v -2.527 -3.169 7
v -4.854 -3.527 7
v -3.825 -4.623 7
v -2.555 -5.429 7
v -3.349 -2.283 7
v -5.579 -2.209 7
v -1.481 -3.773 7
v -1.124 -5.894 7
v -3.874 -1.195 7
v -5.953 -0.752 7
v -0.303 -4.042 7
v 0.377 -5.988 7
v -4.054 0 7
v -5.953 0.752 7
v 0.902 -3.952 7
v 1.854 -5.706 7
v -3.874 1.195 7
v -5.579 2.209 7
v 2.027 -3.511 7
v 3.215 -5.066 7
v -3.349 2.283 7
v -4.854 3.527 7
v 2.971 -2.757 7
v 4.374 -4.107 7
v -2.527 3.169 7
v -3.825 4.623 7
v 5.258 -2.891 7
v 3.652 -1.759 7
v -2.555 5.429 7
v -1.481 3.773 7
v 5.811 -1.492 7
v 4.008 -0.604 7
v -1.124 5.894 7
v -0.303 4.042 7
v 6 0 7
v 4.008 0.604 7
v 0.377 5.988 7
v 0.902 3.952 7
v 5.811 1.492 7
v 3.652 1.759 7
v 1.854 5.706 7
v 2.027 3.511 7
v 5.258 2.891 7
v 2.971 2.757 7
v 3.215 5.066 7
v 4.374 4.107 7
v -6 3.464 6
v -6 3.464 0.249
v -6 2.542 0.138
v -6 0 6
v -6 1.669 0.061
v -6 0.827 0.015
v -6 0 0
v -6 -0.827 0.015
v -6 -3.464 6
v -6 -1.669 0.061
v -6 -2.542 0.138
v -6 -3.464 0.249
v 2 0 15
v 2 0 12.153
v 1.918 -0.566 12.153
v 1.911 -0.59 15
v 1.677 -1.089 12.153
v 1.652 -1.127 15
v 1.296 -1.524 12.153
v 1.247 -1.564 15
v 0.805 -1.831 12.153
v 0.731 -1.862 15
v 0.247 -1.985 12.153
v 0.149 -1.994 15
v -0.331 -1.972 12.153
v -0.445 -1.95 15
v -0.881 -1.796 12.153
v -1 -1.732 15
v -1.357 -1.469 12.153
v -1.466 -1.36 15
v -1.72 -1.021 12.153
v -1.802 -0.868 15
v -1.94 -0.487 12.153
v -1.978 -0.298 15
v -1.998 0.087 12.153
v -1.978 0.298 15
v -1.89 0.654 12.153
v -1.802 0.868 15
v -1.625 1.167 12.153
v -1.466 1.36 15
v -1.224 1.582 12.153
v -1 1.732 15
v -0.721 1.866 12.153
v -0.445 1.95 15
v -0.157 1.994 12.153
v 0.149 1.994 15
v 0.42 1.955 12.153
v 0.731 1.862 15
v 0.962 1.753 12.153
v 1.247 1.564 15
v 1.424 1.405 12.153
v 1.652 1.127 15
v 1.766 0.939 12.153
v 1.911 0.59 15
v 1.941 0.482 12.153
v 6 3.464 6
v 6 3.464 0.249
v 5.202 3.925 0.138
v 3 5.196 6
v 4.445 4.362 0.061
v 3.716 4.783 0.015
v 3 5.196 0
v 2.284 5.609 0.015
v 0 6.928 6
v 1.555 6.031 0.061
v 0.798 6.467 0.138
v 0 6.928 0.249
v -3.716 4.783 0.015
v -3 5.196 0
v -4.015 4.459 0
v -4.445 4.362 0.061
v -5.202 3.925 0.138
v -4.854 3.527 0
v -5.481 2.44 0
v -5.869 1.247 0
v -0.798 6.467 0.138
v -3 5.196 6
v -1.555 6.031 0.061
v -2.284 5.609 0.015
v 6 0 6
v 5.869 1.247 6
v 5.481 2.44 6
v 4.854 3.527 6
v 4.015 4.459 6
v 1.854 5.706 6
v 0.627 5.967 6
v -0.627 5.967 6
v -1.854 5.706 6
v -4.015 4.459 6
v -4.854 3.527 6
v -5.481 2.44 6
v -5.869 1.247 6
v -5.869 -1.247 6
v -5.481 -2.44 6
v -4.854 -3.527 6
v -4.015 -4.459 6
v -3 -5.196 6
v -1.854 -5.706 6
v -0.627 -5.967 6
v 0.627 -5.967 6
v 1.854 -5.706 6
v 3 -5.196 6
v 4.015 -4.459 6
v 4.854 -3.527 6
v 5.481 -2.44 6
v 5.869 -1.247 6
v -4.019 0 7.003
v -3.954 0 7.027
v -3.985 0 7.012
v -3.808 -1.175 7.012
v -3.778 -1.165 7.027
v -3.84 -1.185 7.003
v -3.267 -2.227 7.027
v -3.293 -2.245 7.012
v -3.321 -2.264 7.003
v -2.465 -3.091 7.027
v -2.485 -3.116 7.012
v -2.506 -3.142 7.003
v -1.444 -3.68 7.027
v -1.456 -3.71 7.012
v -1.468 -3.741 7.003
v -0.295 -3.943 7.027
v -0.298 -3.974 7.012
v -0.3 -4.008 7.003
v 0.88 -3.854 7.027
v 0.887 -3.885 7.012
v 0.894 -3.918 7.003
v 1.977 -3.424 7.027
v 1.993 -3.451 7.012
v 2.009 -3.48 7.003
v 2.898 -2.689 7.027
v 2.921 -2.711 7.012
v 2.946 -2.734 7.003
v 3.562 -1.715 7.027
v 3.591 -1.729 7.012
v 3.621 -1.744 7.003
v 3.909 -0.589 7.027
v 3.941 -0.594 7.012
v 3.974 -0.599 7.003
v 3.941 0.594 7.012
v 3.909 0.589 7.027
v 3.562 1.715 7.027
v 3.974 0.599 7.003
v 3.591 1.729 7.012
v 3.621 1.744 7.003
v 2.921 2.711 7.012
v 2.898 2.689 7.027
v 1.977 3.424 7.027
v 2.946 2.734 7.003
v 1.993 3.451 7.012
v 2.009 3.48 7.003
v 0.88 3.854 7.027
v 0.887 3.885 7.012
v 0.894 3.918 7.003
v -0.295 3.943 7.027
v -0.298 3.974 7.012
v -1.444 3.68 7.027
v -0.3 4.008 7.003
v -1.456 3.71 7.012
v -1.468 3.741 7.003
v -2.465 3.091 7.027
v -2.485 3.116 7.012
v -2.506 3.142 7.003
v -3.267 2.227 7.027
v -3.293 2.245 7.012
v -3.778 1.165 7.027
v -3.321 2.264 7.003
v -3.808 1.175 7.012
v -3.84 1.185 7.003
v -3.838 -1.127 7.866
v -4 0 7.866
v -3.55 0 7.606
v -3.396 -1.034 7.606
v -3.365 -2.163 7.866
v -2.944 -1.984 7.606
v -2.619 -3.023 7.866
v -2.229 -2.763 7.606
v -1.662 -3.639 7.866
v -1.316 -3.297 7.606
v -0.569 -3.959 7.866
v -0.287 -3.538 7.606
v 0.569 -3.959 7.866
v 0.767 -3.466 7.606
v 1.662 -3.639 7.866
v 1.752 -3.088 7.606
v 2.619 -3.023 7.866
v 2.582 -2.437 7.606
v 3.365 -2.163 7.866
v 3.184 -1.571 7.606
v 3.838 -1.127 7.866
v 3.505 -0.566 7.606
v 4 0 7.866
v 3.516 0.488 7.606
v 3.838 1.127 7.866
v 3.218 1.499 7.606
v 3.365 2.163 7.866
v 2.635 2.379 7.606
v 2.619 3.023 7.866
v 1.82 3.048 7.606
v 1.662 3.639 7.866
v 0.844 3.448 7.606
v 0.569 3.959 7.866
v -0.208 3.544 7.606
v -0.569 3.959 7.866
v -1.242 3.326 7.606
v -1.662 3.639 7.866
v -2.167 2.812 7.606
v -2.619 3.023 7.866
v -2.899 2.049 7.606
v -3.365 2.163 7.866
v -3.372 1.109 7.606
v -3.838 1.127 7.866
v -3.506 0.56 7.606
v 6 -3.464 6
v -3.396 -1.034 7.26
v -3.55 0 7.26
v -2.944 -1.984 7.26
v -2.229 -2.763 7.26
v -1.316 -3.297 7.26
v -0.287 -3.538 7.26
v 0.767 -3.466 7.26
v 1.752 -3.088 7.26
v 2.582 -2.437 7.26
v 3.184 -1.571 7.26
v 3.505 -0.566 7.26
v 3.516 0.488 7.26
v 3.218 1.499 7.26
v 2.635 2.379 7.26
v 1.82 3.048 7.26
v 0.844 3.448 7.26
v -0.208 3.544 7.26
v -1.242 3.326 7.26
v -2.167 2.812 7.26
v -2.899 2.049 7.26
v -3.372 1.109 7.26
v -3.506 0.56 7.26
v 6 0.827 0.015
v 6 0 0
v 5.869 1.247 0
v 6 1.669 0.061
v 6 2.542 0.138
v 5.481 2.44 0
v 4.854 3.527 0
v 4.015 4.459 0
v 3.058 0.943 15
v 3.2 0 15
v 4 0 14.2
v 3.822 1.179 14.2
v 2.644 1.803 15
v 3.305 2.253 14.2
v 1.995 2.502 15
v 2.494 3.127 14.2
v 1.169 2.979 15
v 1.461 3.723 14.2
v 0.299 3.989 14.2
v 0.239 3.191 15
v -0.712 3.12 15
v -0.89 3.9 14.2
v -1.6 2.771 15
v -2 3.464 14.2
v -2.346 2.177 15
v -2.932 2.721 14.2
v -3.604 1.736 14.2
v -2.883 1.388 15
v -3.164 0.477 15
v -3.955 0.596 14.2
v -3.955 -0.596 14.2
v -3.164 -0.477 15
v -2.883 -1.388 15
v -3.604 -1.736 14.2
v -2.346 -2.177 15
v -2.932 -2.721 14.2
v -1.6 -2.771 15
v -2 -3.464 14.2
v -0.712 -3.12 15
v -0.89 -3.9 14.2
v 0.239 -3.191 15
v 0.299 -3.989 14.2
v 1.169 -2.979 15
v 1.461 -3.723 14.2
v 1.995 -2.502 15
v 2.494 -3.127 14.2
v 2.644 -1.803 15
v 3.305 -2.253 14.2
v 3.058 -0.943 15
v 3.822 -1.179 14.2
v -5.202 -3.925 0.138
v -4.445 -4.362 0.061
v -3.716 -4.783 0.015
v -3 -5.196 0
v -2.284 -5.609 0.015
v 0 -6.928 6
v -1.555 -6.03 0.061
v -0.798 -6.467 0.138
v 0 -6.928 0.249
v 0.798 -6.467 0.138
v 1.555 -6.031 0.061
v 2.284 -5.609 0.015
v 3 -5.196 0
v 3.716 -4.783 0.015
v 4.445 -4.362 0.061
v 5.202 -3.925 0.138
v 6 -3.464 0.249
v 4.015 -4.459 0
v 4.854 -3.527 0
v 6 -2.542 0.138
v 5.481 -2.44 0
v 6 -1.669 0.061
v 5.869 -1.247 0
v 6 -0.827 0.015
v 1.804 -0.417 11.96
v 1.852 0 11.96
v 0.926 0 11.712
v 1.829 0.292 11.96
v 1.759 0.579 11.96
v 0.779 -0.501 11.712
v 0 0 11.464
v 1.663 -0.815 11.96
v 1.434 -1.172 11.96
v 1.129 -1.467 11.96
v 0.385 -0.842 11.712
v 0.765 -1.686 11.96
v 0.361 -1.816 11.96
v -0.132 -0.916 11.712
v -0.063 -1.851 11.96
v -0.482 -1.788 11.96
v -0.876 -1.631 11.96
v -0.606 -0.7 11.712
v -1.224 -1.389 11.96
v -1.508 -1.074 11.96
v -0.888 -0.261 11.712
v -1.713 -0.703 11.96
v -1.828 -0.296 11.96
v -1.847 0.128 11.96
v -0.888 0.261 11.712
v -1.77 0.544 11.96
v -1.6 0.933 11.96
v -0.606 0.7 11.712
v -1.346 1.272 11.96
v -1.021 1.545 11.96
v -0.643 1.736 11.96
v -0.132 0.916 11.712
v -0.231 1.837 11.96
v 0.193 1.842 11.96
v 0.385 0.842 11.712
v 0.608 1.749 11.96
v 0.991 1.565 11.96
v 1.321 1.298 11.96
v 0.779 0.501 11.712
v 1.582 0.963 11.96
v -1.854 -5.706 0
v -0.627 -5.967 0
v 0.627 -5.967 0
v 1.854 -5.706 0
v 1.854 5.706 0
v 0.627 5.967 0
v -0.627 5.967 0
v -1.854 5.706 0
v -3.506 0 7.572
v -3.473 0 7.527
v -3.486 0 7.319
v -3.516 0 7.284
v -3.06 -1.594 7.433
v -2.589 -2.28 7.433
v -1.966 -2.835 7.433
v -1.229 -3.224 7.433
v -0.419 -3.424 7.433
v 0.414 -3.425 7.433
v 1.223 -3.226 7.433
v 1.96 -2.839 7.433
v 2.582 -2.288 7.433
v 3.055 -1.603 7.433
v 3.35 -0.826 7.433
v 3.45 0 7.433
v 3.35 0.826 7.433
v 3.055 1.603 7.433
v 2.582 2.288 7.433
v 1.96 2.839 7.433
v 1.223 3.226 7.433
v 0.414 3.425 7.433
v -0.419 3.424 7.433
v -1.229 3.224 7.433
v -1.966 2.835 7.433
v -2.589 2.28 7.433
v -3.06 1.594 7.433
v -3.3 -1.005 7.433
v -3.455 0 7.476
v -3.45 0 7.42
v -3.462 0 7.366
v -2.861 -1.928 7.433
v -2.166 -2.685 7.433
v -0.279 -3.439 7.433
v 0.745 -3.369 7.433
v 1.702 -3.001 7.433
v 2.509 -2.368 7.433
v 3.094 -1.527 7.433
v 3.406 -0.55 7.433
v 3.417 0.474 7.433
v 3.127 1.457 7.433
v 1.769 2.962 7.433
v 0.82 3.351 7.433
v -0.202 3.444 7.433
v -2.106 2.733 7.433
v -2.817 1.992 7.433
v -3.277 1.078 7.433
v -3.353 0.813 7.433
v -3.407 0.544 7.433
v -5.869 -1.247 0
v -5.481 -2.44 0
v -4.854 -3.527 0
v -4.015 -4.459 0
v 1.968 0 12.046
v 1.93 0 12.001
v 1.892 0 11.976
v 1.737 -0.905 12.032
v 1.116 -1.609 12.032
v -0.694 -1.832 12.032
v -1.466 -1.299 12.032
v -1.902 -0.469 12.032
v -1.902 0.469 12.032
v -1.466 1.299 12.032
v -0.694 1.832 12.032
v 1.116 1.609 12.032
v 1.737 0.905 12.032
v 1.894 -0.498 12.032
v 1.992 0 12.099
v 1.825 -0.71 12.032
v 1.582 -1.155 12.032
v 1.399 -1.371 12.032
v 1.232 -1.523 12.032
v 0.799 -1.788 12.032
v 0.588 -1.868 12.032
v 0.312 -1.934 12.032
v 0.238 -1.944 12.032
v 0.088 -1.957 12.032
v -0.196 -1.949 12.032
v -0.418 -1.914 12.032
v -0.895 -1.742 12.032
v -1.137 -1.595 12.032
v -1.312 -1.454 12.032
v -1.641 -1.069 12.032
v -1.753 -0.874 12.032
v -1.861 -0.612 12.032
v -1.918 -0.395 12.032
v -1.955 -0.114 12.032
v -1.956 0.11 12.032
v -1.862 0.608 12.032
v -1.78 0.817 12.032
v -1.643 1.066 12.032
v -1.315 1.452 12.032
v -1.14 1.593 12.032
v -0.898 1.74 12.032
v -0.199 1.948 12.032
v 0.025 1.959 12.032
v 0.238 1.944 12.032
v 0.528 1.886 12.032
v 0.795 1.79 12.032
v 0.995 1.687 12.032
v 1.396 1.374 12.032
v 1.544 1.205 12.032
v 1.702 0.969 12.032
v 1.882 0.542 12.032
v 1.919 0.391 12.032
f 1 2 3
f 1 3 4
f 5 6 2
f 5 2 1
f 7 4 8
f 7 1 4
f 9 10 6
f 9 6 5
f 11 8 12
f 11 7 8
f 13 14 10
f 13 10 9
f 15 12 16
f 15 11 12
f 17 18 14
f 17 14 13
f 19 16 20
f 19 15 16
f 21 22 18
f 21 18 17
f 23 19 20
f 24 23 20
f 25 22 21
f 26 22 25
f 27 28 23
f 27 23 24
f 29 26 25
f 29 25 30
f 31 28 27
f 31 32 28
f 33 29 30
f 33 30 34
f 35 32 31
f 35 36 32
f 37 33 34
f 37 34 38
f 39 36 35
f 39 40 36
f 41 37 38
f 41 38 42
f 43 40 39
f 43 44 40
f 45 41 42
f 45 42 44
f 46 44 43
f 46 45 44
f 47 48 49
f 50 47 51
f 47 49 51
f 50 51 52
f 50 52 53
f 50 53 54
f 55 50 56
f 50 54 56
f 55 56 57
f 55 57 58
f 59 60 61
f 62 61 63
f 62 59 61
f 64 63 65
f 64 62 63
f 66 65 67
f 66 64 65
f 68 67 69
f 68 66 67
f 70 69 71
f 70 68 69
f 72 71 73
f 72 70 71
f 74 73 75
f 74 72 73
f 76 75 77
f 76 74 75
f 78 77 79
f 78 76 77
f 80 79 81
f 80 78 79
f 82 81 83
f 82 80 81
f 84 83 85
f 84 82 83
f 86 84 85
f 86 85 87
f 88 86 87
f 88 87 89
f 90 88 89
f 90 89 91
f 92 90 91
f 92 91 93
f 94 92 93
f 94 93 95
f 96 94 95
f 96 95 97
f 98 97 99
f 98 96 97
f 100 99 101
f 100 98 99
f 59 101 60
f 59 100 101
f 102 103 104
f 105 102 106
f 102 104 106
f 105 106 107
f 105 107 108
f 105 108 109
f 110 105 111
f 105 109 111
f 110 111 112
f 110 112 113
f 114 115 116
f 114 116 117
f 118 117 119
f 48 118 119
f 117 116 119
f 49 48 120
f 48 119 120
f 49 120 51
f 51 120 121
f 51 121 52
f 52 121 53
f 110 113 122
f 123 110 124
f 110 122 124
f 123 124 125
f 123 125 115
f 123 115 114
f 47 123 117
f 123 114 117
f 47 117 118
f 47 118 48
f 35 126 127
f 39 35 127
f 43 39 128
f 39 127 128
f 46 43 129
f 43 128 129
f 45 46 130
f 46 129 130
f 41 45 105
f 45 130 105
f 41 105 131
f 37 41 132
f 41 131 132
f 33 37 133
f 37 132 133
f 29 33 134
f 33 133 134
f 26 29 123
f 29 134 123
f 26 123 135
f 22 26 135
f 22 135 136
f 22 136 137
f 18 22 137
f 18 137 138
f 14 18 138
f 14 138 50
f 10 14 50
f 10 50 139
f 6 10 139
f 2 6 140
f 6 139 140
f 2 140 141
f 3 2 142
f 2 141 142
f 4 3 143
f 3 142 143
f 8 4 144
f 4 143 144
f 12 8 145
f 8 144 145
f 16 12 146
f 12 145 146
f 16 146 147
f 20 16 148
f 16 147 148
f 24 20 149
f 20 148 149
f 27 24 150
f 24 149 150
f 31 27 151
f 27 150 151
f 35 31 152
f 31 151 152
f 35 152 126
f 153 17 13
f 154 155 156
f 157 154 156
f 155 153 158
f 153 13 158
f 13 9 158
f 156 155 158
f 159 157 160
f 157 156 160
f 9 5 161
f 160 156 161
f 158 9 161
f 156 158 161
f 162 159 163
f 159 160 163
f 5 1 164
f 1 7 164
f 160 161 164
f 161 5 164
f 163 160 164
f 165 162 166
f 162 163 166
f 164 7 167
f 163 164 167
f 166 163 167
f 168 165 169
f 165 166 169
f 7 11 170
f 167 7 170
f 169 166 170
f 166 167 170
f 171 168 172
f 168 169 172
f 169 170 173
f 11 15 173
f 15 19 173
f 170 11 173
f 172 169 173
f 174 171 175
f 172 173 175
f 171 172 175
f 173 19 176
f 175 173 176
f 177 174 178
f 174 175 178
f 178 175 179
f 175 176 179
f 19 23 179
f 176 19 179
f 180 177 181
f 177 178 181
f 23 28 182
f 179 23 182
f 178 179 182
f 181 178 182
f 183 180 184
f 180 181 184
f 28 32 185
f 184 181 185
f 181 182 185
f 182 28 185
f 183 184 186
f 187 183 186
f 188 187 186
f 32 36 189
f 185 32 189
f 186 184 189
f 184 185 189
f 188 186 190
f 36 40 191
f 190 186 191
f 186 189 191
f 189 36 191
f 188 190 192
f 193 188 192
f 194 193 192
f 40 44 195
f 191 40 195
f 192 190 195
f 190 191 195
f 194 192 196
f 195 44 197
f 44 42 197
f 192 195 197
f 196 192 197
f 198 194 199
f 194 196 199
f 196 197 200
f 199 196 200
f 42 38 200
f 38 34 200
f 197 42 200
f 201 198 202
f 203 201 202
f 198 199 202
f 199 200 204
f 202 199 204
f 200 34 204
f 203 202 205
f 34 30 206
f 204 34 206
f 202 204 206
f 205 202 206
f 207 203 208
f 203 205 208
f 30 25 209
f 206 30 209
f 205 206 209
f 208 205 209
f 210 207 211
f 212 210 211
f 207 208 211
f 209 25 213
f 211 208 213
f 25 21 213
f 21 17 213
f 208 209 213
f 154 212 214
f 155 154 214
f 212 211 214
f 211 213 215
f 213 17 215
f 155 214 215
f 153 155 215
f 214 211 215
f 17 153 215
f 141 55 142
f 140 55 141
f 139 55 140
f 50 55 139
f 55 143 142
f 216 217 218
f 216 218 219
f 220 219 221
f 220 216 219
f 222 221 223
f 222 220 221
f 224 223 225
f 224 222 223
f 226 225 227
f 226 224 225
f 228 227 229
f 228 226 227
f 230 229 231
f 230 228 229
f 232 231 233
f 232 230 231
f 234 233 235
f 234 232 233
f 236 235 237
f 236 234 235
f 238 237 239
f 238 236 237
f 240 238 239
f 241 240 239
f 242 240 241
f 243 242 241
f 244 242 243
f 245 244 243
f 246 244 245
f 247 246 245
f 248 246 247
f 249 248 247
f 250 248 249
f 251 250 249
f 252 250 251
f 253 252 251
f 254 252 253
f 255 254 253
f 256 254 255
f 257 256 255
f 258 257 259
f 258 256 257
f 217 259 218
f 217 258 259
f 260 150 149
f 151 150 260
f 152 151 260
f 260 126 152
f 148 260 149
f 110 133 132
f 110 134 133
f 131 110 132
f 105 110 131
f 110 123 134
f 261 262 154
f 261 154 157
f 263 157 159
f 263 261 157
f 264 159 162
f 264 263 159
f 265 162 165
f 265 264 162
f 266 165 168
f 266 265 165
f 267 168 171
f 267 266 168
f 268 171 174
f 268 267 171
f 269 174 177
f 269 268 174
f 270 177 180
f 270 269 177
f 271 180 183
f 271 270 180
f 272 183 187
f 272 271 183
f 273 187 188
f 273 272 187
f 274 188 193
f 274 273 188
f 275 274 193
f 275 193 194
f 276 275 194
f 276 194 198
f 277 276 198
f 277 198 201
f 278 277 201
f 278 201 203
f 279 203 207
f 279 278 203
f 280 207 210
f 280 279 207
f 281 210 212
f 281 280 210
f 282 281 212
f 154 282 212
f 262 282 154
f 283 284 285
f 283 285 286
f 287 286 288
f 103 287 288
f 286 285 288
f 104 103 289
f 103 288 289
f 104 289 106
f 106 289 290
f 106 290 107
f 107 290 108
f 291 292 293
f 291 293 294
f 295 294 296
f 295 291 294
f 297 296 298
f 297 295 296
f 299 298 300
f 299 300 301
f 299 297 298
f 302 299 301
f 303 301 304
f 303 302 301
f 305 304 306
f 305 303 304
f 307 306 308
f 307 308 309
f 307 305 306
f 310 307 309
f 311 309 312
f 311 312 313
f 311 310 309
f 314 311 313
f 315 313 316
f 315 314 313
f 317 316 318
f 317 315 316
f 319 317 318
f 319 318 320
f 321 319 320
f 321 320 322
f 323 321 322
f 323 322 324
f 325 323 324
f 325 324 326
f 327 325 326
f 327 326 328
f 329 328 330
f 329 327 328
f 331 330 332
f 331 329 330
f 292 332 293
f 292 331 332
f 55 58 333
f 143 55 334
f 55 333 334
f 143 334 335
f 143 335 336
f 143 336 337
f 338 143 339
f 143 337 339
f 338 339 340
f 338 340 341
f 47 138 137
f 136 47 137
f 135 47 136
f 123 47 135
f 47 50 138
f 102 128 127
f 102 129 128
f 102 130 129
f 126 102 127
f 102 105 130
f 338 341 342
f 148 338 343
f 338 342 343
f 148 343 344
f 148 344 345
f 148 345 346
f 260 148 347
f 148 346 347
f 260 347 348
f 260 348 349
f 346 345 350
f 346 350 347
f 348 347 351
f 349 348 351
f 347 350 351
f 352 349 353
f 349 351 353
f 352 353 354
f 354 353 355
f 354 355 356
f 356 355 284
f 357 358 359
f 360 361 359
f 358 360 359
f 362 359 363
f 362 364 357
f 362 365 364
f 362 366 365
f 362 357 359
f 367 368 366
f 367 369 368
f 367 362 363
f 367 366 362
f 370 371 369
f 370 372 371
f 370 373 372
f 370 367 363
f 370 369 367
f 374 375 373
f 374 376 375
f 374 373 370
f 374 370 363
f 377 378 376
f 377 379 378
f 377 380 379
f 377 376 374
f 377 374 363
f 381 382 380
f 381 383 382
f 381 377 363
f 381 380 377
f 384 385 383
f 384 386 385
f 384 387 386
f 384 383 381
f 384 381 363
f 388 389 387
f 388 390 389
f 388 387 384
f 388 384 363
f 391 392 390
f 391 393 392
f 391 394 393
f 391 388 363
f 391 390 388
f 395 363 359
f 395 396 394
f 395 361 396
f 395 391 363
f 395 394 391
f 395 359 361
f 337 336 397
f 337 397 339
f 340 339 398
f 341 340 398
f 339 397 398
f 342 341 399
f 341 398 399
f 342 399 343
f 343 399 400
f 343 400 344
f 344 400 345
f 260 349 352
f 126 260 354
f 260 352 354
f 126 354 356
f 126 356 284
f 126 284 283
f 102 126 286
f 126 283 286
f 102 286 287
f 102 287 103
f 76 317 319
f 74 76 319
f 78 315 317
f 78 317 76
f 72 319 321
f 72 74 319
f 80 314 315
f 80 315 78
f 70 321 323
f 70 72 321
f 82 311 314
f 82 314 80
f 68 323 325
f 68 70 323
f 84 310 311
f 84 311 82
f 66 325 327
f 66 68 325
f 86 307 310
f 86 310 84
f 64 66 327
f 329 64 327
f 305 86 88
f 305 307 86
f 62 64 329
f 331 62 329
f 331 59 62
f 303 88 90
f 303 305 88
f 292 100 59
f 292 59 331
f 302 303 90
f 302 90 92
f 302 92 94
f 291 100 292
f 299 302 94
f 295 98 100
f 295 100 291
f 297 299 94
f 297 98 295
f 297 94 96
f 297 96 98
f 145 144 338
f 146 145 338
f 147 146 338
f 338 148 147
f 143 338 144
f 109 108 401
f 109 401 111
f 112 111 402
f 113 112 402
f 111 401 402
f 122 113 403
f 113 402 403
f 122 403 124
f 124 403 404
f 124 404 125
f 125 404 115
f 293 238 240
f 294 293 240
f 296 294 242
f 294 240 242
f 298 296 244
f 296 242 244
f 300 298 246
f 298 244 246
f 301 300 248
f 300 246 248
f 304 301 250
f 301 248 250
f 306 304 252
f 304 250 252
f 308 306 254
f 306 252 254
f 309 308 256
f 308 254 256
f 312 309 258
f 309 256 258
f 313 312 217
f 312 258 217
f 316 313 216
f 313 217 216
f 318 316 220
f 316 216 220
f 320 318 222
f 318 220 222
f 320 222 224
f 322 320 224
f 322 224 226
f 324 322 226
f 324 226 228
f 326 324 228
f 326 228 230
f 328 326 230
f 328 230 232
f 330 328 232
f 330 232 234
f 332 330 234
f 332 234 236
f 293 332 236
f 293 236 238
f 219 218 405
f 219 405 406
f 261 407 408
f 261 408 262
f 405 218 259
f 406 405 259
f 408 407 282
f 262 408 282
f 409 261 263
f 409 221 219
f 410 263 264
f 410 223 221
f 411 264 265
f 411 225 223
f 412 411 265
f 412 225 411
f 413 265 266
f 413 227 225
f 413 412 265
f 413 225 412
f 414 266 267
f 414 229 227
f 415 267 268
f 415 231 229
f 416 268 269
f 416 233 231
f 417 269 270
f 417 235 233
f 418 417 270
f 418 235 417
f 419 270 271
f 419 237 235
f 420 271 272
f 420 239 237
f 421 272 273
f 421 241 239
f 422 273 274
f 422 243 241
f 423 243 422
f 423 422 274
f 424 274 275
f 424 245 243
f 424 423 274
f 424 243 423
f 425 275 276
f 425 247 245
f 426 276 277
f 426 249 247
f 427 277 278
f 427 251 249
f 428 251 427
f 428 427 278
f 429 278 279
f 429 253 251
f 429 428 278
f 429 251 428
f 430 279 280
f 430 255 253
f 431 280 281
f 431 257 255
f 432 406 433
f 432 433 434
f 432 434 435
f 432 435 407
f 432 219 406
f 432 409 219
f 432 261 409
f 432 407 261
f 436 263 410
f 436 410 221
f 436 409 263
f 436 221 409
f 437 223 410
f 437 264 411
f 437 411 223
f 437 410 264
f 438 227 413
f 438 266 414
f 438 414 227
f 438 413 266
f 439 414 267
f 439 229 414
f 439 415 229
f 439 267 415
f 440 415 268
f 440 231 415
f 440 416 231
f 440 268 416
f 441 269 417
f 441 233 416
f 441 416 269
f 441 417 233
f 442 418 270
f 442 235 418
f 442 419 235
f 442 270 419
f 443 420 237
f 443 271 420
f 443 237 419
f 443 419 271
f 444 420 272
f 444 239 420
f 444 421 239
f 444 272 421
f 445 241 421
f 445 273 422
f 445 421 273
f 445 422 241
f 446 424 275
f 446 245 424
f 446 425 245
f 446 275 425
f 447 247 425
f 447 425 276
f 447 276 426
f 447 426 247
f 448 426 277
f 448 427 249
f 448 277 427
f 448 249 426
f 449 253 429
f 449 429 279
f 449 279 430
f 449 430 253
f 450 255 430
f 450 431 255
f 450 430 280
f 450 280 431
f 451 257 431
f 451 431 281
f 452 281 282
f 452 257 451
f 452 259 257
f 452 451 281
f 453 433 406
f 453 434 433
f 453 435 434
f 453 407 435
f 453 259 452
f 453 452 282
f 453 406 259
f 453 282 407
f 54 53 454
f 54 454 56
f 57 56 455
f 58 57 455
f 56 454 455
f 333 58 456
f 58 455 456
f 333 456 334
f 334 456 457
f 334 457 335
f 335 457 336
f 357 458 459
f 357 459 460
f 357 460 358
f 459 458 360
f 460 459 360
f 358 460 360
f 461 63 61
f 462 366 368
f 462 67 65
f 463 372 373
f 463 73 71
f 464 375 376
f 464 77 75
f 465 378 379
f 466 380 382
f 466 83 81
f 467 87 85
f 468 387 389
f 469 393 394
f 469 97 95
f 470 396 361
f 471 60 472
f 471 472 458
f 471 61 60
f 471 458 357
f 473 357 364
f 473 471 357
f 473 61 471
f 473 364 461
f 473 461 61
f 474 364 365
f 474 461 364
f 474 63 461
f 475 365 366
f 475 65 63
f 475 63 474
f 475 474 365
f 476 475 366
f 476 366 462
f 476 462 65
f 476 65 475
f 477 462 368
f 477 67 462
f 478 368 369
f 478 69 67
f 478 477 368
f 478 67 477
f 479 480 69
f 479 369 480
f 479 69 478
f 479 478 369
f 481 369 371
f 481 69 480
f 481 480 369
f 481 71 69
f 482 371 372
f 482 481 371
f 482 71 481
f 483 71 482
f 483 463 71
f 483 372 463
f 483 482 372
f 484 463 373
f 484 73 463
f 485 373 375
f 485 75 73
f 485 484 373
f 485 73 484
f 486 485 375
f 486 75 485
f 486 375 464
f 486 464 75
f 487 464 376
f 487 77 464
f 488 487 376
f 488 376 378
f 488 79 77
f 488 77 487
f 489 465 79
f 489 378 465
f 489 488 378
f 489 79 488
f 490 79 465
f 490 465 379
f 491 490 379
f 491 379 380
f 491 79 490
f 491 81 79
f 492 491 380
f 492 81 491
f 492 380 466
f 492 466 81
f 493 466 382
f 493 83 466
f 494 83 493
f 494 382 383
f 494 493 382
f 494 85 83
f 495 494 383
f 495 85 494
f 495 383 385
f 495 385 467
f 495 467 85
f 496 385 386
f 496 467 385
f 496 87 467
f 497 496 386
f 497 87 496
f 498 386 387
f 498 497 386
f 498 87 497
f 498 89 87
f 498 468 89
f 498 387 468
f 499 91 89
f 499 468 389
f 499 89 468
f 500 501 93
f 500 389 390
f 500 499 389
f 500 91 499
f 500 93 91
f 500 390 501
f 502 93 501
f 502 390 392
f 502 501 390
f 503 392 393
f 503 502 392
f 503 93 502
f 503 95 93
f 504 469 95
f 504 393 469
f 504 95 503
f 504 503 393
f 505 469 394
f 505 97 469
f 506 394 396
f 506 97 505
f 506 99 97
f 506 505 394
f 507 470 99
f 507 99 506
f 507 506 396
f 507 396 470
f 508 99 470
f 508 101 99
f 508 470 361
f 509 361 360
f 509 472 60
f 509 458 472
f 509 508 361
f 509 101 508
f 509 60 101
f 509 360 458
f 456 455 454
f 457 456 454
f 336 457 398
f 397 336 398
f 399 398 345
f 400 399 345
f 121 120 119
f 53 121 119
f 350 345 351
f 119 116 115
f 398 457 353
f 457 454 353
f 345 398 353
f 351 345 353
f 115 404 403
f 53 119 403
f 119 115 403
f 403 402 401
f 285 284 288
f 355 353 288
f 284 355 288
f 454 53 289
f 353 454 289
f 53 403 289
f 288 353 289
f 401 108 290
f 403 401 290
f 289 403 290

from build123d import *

# Parameters (mm, degrees)
VYSUNOUT1_DEPTH = 6
SKICA3_R        = 6
VYSUNOUT2_DEPTH = 1
SKICA4_R        = 4
VYSUNOUT3_DEPTH = 8
ZKOSIT1_SIZE    = 0.8
ZAOBLIT1_R      = 0.2
ZAOBLIT2_R      = 0.2


with BuildPart() as part:
    # Skica1 → Vysunout1 (new body)
    with BuildSketch(Plane.XY):
        Polygon((6, 3.464101615), (0, 6.92820323), (-6, 3.464101615), (-6, -3.464101615), (0, -6.92820323), (6, -3.464101615), align=None)
    extrude(amount=VYSUNOUT1_DEPTH)

    # Skica2 → Odebrat otočením1 (revolve, cut)
    with BuildSketch(Plane(origin=(0, 0, 0), x_dir=(1, 0, 0), z_dir=(0, 1, 0))):
        Polygon((6, 0), (28.392304845, 0), (28.392304845, -6), align=None)
    revolve(axis=Axis((0, 0, 0), (0, 0, 1)), mode=Mode.SUBTRACT)

    # Skica3 → Vysunout2 (add)
    with BuildSketch(Plane.XY.offset(6)):
        Circle(SKICA3_R)
    extrude(amount=VYSUNOUT2_DEPTH)

    # Skica4 → Vysunout3 (add)
    with BuildSketch(Plane.XY.offset(7)):
        Circle(SKICA4_R)
    extrude(amount=VYSUNOUT3_DEPTH)

    # Zkosit1
    zkosit1_edges = [part.edges().sort_by_distance(p)[0] for p in [
        (-4, 0, 15),
    ]]
    chamfer(zkosit1_edges, length=ZKOSIT1_SIZE)

    # Skica6 → Odebrat otočením2 (revolve, cut)
    with BuildSketch(Plane(origin=(0, 0, 0), x_dir=(1, 0, 0), z_dir=(0, 1, 0))):
        Polygon((0, -11.464101615), (2, -12), (2, -15), (0, -15), align=None)
    revolve(axis=Axis((0, 0, 15), (0, 0, -1)), mode=Mode.SUBTRACT)

    # Zaoblit1
    zaoblit1_edges = [part.edges().sort_by_distance(p)[0] for p in [
        (-2, 0, 12),
    ]]
    fillet(zaoblit1_edges, radius=ZAOBLIT1_R)

    # Skica7 → Odebrat otočením3 (revolve, cut)
    with BuildSketch(Plane(origin=(0, 0, 0), x_dir=(1, 0, 0), z_dir=(0, 1, 0)), mode=Mode.PRIVATE) as odebrat_oto_en_m3_sk:
        Polygon((4, -7), (3.25, -7.433012702), (4, -7.866025404), align=None)
    revolve(odebrat_oto_en_m3_sk.sketch.rotate(Axis((0, 0, 0), (0, 0, 1)), 180), axis=Axis((0, 0, 0), (0, 0, 1)), mode=Mode.SUBTRACT)

    # Zaoblit2
    zaoblit2_edges = [part.edges().sort_by_distance(p)[0] for p in [
        (3.25, 0, 7.433012702),
        (4, 0, 7),
    ]]
    fillet(zaoblit2_edges, radius=ZAOBLIT2_R)


solid = part.part
